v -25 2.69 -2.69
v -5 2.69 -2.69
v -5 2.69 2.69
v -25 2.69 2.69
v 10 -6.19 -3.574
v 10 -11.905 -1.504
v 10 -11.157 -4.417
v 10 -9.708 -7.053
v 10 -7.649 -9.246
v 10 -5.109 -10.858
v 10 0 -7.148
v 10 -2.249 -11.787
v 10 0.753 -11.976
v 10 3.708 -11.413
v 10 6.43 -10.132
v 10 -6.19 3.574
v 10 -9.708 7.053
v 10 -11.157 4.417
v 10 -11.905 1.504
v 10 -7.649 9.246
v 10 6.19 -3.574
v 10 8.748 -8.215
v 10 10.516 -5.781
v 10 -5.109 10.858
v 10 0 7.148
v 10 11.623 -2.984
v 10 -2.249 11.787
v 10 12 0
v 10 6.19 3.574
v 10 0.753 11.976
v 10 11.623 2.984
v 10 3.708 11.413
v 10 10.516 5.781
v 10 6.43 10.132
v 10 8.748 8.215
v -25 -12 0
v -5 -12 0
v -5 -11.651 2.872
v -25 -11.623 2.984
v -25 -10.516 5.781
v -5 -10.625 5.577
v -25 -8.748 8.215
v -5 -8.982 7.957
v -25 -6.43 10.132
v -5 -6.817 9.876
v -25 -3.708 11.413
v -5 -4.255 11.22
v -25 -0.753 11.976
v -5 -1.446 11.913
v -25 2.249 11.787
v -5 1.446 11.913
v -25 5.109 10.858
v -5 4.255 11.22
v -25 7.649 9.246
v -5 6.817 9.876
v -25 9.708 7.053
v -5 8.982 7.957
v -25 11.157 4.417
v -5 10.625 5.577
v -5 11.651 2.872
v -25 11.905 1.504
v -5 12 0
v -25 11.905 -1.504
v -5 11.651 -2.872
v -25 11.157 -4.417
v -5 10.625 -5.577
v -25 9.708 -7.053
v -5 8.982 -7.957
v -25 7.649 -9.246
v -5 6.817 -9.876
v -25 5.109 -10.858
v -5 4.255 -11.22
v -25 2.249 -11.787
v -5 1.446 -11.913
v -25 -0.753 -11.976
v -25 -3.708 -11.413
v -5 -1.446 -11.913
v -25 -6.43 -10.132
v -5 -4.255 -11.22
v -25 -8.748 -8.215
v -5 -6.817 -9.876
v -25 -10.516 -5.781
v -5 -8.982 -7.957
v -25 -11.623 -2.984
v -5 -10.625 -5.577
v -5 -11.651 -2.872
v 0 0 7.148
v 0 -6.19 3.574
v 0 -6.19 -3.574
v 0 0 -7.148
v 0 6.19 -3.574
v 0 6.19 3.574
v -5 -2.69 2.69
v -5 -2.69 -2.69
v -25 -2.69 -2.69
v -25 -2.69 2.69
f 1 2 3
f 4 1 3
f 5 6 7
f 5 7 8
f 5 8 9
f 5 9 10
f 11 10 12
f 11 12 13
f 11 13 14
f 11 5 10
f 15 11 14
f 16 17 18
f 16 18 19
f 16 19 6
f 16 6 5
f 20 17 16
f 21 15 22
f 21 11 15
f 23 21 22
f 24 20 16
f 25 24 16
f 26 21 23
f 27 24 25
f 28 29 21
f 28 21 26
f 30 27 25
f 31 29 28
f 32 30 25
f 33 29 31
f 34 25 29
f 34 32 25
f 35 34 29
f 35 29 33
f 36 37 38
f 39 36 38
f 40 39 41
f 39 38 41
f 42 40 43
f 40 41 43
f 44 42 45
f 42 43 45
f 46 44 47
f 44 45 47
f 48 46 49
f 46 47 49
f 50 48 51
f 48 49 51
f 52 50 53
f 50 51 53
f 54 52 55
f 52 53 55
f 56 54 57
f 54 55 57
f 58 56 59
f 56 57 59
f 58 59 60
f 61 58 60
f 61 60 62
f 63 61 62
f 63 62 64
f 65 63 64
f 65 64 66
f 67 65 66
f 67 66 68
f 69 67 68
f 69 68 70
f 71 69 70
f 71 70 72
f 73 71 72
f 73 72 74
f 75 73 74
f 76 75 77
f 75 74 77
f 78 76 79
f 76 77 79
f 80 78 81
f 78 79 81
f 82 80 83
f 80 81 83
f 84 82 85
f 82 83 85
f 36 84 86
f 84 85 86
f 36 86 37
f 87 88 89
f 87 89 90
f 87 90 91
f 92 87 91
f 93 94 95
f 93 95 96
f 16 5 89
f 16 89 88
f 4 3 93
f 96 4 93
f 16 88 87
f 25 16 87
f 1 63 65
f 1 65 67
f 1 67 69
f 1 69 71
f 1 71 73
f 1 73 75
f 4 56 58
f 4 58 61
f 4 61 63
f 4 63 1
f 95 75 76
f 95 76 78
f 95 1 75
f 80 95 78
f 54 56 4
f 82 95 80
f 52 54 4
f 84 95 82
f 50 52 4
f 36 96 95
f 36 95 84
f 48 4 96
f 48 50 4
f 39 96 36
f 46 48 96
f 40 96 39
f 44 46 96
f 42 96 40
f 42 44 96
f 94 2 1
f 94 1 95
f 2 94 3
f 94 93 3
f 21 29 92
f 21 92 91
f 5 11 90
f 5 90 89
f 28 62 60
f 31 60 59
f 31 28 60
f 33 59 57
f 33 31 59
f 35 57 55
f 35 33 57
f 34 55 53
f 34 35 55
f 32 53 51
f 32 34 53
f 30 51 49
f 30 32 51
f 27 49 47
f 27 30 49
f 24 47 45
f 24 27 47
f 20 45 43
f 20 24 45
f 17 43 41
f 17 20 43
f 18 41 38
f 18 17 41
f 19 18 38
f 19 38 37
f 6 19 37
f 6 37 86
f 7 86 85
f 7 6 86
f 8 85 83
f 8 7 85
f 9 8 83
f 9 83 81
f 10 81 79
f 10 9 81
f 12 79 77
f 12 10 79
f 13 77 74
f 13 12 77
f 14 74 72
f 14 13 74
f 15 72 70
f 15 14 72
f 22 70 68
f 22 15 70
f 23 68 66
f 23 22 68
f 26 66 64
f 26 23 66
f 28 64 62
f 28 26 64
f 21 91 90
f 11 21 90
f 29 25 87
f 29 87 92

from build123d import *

# Parameters (mm, degrees)
F0_R     = 12
F1_DEPTH = 10
F2_DEPTH = 5
F3_R     = 12
F3_W     = 5.38
F3_H     = 5.38
F4_DEPTH = 20


with BuildPart() as f1:
    # F0 (on Right) → F1 (new body)
    with BuildSketch(Plane.YZ):
        Circle(F0_R)
        Polygon((0, 7.147596), (6.19, 3.573798), (6.19, -3.573798), (0, -7.147596), (-6.19, -3.573798), (-6.19, 3.573798), align=None, mode=Mode.SUBTRACT)
    extrude(amount=F1_DEPTH)

    # F0 (on Right) → F2 (join)
    with BuildSketch(Plane.YZ):
        Circle(F0_R)
        Polygon((0, 7.147596), (6.19, 3.573798), (6.19, -3.573798), (0, -7.147596), (-6.19, -3.573798), (-6.19, 3.573798), align=None, mode=Mode.SUBTRACT)
        Polygon((6.19, -3.573798), (6.19, 3.573798), (0, 7.147596), (-6.19, 3.573798), (-6.19, -3.573798), (0, -7.147596), align=None)
    extrude(amount=-F2_DEPTH)

    # F3 (on face) → F4 (join)
    with BuildSketch(Plane(origin=(-5, 0, 0), x_dir=(0, -1, 0), z_dir=(-1, 0, 0))):
        Circle(F3_R)
        Rectangle(F3_W, F3_H, mode=Mode.SUBTRACT)
    extrude(amount=F4_DEPTH)


solid = f1.part
